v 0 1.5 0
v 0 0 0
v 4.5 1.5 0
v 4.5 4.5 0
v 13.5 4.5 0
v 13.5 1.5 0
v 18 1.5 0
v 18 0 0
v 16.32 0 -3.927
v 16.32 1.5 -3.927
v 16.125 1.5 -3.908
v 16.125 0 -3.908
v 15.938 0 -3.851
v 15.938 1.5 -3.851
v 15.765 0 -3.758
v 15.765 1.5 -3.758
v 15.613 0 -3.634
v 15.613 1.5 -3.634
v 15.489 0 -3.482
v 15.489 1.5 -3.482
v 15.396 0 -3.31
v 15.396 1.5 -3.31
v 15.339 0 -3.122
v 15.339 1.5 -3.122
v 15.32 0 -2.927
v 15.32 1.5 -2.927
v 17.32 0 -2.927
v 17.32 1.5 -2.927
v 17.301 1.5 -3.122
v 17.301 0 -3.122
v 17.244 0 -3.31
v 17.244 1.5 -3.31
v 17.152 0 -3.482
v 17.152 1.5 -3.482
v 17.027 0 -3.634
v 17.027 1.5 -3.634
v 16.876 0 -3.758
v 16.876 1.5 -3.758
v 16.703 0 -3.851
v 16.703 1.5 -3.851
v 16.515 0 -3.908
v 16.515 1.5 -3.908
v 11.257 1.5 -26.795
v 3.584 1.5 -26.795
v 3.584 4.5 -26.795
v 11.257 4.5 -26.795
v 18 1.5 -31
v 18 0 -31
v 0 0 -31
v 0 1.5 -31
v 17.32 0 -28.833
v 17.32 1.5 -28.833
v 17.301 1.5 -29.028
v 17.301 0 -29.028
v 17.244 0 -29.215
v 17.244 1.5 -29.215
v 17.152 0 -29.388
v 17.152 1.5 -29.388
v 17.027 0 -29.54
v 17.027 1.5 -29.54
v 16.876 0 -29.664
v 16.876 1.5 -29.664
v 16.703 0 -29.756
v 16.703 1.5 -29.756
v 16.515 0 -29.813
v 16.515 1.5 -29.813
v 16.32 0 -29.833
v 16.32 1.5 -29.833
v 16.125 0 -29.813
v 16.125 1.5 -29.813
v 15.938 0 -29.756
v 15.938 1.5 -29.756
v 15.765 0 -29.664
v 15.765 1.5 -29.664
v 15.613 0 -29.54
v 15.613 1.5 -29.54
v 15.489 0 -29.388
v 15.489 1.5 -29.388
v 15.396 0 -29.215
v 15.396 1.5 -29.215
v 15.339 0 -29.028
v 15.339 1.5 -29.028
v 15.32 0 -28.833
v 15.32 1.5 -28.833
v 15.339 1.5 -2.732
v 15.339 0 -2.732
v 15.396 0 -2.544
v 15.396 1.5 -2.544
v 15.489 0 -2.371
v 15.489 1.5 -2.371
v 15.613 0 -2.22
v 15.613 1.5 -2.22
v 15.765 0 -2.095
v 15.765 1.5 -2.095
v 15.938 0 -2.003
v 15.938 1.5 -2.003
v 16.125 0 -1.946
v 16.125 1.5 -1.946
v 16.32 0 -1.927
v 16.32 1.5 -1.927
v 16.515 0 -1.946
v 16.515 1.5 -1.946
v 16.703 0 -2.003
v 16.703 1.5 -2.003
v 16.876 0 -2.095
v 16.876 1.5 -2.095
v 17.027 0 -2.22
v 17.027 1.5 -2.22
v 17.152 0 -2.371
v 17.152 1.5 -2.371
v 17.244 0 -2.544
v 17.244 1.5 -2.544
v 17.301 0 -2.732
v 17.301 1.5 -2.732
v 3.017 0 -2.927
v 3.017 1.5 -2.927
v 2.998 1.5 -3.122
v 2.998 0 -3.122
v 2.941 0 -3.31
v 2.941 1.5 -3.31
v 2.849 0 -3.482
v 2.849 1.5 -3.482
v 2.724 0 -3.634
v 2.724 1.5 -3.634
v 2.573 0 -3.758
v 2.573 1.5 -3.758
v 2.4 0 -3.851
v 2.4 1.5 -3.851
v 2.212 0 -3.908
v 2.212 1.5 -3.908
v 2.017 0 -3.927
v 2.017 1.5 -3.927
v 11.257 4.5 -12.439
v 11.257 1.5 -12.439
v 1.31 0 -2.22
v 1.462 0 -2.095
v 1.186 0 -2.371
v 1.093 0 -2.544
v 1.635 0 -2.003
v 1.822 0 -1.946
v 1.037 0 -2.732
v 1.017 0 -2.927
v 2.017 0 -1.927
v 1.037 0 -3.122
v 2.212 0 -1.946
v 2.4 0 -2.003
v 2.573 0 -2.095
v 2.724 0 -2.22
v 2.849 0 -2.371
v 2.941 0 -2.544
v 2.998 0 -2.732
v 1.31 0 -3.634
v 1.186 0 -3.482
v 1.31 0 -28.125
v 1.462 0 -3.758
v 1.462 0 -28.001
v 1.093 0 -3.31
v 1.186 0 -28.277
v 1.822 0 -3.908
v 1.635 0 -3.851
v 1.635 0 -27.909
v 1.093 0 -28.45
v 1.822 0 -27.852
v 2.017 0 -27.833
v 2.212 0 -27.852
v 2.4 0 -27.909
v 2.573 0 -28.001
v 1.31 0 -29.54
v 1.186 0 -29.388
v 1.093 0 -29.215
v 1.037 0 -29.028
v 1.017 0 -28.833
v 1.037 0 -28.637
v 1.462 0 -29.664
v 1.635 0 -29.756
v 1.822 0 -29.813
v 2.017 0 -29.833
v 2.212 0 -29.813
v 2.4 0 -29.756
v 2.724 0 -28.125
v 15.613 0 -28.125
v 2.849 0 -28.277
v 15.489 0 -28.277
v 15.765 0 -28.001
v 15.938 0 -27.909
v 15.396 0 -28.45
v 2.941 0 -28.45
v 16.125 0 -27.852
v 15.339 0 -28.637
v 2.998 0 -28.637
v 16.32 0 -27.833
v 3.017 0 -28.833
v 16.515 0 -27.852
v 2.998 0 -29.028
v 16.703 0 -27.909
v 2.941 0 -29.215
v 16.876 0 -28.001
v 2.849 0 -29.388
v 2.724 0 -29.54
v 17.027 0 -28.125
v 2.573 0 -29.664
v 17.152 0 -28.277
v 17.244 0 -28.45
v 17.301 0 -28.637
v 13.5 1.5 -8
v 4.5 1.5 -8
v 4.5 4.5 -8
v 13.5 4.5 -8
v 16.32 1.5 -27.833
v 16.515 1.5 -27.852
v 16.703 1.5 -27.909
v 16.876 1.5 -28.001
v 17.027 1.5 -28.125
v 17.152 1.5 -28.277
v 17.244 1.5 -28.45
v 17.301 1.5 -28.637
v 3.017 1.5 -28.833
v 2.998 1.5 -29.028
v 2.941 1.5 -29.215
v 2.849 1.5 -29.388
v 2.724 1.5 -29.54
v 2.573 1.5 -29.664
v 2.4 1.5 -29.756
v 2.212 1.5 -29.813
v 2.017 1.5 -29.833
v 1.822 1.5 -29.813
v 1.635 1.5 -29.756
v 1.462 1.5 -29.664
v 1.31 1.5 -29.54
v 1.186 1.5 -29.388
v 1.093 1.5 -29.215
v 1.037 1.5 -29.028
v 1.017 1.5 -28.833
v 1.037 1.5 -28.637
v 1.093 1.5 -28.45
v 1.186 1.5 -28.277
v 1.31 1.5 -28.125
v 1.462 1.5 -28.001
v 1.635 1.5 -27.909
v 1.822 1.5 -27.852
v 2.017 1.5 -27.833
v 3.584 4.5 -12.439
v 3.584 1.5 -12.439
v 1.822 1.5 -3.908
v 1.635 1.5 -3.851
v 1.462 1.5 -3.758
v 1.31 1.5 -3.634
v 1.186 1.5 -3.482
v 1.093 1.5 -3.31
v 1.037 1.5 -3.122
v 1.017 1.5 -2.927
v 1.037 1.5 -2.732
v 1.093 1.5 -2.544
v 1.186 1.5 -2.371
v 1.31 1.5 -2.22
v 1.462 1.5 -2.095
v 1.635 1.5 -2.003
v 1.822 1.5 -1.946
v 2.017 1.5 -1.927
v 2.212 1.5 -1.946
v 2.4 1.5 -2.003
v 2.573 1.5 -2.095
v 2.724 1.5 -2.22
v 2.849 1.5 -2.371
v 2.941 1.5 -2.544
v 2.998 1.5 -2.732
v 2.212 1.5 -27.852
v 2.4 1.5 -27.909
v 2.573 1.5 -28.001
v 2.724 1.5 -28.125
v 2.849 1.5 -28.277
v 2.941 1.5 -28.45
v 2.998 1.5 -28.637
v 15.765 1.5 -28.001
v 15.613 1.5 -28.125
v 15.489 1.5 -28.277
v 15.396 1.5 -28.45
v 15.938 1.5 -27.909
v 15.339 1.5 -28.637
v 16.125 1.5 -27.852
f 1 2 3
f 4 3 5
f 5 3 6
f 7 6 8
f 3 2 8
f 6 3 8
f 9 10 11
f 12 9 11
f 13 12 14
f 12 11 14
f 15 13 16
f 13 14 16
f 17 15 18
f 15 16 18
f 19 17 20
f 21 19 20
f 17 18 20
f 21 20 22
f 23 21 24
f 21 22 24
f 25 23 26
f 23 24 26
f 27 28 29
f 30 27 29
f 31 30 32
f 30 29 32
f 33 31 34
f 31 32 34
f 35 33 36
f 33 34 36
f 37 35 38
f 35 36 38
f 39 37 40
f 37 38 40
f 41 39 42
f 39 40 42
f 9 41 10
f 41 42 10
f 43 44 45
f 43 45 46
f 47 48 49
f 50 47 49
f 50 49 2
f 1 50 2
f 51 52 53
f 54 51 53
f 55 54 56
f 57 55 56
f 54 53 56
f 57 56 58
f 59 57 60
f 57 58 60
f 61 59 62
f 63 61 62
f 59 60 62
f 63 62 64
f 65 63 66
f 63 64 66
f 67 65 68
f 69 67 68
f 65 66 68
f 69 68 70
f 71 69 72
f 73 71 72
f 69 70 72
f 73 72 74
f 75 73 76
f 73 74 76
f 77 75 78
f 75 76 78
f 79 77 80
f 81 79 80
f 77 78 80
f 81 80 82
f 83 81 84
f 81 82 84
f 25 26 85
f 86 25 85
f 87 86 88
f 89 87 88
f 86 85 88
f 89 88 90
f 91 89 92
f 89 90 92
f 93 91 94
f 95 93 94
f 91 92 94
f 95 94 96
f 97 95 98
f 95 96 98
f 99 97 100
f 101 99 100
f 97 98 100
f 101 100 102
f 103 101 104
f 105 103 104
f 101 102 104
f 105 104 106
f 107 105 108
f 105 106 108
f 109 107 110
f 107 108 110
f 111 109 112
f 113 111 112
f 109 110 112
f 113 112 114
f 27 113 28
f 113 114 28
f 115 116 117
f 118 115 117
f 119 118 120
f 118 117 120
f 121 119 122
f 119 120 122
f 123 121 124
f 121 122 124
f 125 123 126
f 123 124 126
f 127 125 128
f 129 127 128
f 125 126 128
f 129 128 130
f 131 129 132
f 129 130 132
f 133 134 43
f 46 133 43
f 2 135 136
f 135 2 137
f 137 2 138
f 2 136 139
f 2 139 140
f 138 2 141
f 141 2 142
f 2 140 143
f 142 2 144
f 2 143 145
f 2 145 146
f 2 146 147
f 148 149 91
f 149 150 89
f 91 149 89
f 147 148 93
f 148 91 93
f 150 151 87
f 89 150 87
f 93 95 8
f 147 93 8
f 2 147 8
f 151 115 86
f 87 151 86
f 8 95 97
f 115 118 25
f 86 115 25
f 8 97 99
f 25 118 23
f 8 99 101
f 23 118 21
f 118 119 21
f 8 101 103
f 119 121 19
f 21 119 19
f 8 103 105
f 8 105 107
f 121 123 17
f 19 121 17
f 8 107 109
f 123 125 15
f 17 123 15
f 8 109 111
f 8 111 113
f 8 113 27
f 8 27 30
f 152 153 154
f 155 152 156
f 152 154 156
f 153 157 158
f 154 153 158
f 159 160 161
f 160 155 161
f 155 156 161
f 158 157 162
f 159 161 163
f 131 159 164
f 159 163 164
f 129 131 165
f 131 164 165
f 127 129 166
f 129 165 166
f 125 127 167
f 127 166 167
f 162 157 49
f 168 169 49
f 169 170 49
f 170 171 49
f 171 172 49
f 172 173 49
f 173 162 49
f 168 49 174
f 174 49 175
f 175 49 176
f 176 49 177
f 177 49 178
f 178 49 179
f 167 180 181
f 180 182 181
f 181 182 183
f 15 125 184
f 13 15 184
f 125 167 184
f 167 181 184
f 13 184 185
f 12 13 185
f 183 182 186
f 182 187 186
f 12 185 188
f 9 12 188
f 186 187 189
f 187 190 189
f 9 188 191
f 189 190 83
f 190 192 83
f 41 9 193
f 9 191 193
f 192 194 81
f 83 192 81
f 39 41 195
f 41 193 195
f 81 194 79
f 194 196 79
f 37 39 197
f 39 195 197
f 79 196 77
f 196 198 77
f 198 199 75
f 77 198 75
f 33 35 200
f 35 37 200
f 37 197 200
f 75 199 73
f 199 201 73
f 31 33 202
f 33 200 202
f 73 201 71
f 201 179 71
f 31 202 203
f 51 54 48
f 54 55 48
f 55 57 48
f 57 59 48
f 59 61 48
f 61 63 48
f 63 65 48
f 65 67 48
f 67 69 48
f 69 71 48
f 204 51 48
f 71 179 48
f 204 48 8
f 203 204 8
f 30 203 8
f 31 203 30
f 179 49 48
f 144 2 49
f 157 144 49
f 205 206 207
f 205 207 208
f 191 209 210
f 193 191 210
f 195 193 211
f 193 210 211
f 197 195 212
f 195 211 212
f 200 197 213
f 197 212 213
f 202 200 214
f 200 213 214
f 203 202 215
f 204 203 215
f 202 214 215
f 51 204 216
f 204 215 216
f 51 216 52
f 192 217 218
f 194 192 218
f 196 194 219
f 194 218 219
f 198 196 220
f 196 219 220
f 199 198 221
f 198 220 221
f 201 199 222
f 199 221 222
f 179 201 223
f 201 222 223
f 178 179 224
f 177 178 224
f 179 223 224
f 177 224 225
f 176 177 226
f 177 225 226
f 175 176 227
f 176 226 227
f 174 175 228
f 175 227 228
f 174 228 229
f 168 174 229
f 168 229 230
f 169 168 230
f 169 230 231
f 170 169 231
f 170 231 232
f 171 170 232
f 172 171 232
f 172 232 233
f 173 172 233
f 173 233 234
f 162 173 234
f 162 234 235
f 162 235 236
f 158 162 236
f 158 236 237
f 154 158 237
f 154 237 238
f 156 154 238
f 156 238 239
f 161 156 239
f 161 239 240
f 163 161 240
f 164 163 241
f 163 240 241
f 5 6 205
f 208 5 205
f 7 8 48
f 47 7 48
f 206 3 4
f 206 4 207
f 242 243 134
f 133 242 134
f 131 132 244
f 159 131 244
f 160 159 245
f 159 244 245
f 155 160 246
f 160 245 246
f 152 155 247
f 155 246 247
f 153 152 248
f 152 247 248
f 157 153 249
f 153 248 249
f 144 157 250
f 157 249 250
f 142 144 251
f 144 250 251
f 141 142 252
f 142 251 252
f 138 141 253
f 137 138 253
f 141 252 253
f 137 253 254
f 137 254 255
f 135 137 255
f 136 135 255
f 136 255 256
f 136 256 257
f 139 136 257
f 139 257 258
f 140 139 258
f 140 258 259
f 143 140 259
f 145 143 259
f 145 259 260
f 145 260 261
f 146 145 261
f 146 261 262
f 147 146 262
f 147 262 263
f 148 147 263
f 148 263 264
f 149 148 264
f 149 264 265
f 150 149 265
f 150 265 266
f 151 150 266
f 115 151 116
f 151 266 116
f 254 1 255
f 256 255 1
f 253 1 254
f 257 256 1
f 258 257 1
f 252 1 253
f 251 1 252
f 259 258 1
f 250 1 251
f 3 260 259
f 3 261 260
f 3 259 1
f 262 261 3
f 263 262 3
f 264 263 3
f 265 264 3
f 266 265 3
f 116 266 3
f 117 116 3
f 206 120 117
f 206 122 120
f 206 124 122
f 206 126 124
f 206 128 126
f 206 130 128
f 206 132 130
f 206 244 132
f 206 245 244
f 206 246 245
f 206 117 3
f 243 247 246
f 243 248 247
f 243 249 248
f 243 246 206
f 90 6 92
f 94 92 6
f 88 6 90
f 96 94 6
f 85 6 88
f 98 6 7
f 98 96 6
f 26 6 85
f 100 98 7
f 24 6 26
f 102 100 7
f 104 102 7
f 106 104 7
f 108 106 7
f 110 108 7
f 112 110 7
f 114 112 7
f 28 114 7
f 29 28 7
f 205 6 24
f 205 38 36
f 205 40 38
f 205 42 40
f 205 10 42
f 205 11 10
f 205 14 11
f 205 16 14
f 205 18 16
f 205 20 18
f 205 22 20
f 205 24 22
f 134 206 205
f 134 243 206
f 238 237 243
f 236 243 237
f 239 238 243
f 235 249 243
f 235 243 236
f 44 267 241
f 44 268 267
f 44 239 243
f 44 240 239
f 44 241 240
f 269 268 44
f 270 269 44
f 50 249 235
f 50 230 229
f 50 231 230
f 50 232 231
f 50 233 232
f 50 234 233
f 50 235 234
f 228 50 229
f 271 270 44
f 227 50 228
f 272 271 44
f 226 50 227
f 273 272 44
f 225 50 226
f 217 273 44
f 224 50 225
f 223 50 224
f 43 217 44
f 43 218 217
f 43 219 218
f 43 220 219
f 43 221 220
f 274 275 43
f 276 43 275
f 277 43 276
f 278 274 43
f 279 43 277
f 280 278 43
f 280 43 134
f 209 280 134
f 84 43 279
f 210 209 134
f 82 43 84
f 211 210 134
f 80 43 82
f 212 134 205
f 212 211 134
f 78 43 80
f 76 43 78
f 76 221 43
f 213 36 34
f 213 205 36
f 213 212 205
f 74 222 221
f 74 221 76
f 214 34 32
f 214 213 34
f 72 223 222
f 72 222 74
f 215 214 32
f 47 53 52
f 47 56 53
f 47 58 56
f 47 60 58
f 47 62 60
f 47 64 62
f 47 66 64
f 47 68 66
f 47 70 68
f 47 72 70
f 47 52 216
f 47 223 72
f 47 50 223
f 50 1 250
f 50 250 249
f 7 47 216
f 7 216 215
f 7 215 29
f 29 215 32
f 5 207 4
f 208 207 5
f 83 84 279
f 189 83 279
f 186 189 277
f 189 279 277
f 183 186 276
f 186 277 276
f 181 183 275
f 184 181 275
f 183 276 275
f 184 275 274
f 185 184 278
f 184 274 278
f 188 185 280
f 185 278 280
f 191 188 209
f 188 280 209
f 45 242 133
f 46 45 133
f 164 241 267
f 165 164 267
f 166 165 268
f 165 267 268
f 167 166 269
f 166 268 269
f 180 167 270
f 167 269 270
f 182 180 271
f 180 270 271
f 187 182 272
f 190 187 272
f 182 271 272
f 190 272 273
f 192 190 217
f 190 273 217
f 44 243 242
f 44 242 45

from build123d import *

# Parameters (mm, degrees)
SKETCH1_W           = 9
SKETCH1_H           = 8
BOSS_EXTRUDE1_DEPTH = 1.5
SKETCH1_3_W         = 9
SKETCH1_3_H         = 8
BOSS_EXTRUDE2_DEPTH = 4.5
SKETCH2_W           = 7.673510846
SKETCH2_H           = 14.355500628
BOSS_EXTRUDE3_DEPTH = 3
CUT_EXTRUDE1_DEPTH  = 10


with BuildPart() as part:
    # Sketch1 → Boss-Extrude1 (new body)
    with BuildSketch(Plane(origin=(0, 0, 0), x_dir=(1, 0, 0), z_dir=(0, 1, 0))):
        Polygon((0, 31), (0, 0), (4.5, 0), (4.5, 8), (13.5, 8), (13.5, 0), (18, 0), (18, 31), align=None)
        with Locations((9, 4)):
            Rectangle(SKETCH1_W, SKETCH1_H)
    extrude(amount=BOSS_EXTRUDE1_DEPTH)

    # Sketch1<3> → Boss-Extrude2 (add)
    with BuildSketch(Plane(origin=(0, 0, 0), x_dir=(1, 0, 0), z_dir=(0, 1, 0))):
        with Locations((9, 4)):
            Rectangle(SKETCH1_3_W, SKETCH1_3_H)
    extrude(amount=BOSS_EXTRUDE2_DEPTH)

    # Sketch2 → Boss-Extrude3 (add)
    with BuildSketch(Plane(origin=(0, 1.5, 0), x_dir=(1, 0, 0), z_dir=(0, 1, 0))):
        with Locations((7.420466752, 19.616967898)):
            Rectangle(SKETCH2_W, SKETCH2_H)
    extrude(amount=BOSS_EXTRUDE3_DEPTH)

    # Sketch3 → Cut-Extrude1 (cut)
    with BuildSketch(Plane(origin=(0, 1.5, 0), x_dir=(1, 0, 0), z_dir=(0, 1, 0))):
        with BuildLine():
            ThreePointArc((3.017303644, 2.926927408), (2.724410426, 3.634034189), (2.017303644, 3.926927408))
            Line((2.017303644, 3.926927408), (2.017303644, 2.926927408))
            Line((2.017303644, 2.926927408), (3.017303644, 2.926927408))
        make_face()
        with BuildLine():
            Line((2.017303644, 2.926927408), (2.017303644, 3.926927408))
            ThreePointArc((2.017303644, 3.926927408), (1.310196863, 2.219820627), (3.017303644, 2.926927408))
            Line((3.017303644, 2.926927408), (2.017303644, 2.926927408))
        make_face()
        with BuildLine():
            ThreePointArc((17.320228506, 2.926927408), (17.027335287, 3.634034189), (16.320228506, 3.926927408))
            Line((16.320228506, 3.926927408), (16.320228506, 2.926927408))
            Line((16.320228506, 2.926927408), (15.320228506, 2.926927408))
            ThreePointArc((15.320228506, 2.926927408), (16.320228506, 1.926927408), (17.320228506, 2.926927408))
        make_face()
        with BuildLine():
            Line((16.320228506, 2.926927408), (16.320228506, 3.926927408))
            ThreePointArc((16.320228506, 3.926927408), (15.613121724, 3.634034189), (15.320228506, 2.926927408))
            Line((15.320228506, 2.926927408), (16.320228506, 2.926927408))
        make_face()
        with BuildLine():
            Line((2.017303644, 27.83251993), (2.017303644, 28.83251993))
            Line((2.017303644, 28.83251993), (3.017303644, 28.83251993))
            ThreePointArc((3.017303644, 28.83251993), (1.310196863, 29.539626711), (2.017303644, 27.83251993))
        make_face()
        with BuildLine():
            Line((3.017303644, 28.83251993), (2.017303644, 28.83251993))
            Line((2.017303644, 28.83251993), (2.017303644, 27.83251993))
            ThreePointArc((2.017303644, 27.83251993), (2.724410426, 28.125413148), (3.017303644, 28.83251993))
        make_face()
        with BuildLine():
            ThreePointArc((17.320228506, 28.83251993), (16.320228506, 29.83251993), (15.320228506, 28.83251993))
            Line((15.320228506, 28.83251993), (16.320228506, 28.83251993))
            Line((16.320228506, 28.83251993), (16.320228506, 27.83251993))
            ThreePointArc((16.320228506, 27.83251993), (17.027335287, 28.125413148), (17.320228506, 28.83251993))
        make_face()
        with BuildLine():
            Line((16.320228506, 28.83251993), (15.320228506, 28.83251993))
            ThreePointArc((15.320228506, 28.83251993), (15.613121724, 28.125413148), (16.320228506, 27.83251993))
            Line((16.320228506, 27.83251993), (16.320228506, 28.83251993))
        make_face()
    extrude(amount=-CUT_EXTRUDE1_DEPTH, mode=Mode.SUBTRACT)


solid = part.part
